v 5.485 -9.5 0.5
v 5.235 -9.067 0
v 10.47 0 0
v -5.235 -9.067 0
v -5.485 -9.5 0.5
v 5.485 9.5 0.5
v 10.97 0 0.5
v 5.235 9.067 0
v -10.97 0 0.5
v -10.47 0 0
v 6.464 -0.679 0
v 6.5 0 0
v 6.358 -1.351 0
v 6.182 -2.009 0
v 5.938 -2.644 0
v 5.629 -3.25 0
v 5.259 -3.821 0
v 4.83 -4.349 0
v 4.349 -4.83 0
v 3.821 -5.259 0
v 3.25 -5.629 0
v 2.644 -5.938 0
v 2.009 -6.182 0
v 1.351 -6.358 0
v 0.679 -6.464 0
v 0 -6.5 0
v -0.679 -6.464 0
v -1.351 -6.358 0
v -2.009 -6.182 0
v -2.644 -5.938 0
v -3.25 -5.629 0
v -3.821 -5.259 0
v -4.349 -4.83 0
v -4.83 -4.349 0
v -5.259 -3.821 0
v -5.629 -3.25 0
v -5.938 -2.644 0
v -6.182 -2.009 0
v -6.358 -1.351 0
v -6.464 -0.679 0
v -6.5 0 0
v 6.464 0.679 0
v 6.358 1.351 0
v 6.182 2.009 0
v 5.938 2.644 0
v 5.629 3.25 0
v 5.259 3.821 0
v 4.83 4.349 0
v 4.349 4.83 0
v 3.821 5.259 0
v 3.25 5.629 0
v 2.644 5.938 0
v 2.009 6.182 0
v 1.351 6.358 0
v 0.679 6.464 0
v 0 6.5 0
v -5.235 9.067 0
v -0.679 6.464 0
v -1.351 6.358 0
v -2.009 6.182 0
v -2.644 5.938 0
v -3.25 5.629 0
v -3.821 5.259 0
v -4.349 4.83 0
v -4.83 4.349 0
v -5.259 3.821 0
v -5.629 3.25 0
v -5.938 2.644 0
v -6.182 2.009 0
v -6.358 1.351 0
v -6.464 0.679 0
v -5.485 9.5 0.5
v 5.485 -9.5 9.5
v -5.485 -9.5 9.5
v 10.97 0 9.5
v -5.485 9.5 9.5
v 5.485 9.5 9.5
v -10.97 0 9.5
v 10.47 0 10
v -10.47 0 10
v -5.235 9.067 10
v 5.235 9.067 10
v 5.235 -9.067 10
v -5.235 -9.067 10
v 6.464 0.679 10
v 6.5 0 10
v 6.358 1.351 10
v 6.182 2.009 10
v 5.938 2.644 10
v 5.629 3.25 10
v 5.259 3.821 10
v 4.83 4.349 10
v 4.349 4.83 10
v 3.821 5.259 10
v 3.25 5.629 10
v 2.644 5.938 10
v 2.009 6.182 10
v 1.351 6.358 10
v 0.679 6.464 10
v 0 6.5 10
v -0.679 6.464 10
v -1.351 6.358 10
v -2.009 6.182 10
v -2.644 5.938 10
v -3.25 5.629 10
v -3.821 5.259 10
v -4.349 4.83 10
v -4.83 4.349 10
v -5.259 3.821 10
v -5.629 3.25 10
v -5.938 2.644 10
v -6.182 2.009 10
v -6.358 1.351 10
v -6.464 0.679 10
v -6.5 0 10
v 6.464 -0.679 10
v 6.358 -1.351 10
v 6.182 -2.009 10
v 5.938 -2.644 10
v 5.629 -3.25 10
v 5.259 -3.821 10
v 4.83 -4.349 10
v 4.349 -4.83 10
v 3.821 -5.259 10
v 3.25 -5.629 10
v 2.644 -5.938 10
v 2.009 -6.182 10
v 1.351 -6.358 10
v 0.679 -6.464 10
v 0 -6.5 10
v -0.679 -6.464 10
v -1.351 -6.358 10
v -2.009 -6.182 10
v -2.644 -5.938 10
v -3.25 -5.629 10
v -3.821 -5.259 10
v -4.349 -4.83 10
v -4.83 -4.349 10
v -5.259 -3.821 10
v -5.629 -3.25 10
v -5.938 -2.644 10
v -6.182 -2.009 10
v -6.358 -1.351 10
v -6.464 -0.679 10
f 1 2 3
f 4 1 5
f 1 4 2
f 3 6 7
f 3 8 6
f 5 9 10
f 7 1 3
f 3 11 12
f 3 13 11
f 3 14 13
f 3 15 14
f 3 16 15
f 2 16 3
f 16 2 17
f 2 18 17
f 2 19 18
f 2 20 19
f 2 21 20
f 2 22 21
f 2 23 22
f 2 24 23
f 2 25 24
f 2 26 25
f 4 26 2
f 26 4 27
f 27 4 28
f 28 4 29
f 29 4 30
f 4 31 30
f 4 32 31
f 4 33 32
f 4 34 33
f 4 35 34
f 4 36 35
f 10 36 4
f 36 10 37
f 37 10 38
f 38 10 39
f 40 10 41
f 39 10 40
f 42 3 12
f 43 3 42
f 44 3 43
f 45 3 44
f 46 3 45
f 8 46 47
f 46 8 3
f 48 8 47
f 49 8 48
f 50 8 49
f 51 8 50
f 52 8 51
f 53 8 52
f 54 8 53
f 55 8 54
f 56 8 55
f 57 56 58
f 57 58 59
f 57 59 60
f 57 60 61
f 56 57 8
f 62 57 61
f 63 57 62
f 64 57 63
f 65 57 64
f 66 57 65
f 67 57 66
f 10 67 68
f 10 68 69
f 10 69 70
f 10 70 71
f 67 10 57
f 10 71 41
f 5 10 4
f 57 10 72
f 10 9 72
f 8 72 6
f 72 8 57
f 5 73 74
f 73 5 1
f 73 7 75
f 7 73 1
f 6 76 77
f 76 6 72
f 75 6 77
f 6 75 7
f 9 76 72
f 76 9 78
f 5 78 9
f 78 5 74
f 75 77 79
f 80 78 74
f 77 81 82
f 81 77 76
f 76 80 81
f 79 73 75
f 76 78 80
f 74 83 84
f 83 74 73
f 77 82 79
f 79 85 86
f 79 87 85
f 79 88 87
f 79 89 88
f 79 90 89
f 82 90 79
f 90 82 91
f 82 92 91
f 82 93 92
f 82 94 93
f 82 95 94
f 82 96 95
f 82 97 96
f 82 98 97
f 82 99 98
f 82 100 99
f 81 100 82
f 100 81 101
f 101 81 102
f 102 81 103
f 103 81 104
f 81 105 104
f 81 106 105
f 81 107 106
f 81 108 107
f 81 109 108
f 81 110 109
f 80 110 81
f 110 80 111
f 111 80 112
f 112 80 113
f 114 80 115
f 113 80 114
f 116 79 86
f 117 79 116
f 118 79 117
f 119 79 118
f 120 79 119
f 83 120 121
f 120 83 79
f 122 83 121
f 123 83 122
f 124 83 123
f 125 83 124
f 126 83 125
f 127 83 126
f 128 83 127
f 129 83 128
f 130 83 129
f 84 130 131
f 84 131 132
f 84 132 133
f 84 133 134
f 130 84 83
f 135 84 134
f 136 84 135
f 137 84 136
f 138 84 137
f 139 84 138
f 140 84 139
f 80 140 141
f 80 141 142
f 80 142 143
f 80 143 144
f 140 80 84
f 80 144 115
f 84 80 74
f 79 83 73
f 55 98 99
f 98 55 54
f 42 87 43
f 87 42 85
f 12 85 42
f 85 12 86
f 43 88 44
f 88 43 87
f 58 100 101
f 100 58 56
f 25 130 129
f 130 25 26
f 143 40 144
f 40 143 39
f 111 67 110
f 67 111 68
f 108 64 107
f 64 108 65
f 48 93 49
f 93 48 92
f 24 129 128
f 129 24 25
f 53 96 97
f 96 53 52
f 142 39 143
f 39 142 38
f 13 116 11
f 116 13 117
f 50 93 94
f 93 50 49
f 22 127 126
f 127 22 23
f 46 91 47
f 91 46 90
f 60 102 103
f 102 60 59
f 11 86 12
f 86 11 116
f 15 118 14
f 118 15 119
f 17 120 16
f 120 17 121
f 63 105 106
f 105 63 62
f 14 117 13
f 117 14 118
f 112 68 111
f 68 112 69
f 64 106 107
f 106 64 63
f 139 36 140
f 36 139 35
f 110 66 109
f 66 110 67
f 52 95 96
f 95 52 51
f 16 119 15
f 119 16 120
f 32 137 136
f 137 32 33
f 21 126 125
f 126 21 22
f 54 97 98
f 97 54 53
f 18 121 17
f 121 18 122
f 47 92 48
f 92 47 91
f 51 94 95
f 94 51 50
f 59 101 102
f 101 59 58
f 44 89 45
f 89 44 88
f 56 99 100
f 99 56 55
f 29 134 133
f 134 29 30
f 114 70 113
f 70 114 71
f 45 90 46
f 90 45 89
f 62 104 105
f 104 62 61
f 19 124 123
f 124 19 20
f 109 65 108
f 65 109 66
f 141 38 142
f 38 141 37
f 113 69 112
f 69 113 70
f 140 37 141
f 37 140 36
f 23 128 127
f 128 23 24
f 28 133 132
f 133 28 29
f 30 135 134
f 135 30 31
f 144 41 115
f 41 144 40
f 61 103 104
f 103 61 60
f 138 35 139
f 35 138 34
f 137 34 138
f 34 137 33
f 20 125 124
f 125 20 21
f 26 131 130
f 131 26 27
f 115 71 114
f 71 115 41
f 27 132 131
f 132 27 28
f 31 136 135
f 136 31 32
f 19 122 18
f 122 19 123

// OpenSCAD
// Through hex nut.
$fn = 60;
eps = 0.02;
thread_clearance_d = 13;
flat = 19;
thickness = 10;
chamfer = 0.5;
difference() {
    union() {
        cylinder(d1 = flat / cos(30) - 2 * chamfer, d2 = flat / cos(30), h = chamfer, $fn = 6);
        translate([0, 0, chamfer]) cylinder(d = flat / cos(30), h = thickness - 2 * chamfer, $fn = 6);
        translate([0, 0, thickness - chamfer]) cylinder(d1 = flat / cos(30), d2 = flat / cos(30) - 2 * chamfer, h = chamfer, $fn = 6);
    }
    translate([0, 0, -eps]) cylinder(d = thread_clearance_d, h = thickness + 2 * eps);
}
